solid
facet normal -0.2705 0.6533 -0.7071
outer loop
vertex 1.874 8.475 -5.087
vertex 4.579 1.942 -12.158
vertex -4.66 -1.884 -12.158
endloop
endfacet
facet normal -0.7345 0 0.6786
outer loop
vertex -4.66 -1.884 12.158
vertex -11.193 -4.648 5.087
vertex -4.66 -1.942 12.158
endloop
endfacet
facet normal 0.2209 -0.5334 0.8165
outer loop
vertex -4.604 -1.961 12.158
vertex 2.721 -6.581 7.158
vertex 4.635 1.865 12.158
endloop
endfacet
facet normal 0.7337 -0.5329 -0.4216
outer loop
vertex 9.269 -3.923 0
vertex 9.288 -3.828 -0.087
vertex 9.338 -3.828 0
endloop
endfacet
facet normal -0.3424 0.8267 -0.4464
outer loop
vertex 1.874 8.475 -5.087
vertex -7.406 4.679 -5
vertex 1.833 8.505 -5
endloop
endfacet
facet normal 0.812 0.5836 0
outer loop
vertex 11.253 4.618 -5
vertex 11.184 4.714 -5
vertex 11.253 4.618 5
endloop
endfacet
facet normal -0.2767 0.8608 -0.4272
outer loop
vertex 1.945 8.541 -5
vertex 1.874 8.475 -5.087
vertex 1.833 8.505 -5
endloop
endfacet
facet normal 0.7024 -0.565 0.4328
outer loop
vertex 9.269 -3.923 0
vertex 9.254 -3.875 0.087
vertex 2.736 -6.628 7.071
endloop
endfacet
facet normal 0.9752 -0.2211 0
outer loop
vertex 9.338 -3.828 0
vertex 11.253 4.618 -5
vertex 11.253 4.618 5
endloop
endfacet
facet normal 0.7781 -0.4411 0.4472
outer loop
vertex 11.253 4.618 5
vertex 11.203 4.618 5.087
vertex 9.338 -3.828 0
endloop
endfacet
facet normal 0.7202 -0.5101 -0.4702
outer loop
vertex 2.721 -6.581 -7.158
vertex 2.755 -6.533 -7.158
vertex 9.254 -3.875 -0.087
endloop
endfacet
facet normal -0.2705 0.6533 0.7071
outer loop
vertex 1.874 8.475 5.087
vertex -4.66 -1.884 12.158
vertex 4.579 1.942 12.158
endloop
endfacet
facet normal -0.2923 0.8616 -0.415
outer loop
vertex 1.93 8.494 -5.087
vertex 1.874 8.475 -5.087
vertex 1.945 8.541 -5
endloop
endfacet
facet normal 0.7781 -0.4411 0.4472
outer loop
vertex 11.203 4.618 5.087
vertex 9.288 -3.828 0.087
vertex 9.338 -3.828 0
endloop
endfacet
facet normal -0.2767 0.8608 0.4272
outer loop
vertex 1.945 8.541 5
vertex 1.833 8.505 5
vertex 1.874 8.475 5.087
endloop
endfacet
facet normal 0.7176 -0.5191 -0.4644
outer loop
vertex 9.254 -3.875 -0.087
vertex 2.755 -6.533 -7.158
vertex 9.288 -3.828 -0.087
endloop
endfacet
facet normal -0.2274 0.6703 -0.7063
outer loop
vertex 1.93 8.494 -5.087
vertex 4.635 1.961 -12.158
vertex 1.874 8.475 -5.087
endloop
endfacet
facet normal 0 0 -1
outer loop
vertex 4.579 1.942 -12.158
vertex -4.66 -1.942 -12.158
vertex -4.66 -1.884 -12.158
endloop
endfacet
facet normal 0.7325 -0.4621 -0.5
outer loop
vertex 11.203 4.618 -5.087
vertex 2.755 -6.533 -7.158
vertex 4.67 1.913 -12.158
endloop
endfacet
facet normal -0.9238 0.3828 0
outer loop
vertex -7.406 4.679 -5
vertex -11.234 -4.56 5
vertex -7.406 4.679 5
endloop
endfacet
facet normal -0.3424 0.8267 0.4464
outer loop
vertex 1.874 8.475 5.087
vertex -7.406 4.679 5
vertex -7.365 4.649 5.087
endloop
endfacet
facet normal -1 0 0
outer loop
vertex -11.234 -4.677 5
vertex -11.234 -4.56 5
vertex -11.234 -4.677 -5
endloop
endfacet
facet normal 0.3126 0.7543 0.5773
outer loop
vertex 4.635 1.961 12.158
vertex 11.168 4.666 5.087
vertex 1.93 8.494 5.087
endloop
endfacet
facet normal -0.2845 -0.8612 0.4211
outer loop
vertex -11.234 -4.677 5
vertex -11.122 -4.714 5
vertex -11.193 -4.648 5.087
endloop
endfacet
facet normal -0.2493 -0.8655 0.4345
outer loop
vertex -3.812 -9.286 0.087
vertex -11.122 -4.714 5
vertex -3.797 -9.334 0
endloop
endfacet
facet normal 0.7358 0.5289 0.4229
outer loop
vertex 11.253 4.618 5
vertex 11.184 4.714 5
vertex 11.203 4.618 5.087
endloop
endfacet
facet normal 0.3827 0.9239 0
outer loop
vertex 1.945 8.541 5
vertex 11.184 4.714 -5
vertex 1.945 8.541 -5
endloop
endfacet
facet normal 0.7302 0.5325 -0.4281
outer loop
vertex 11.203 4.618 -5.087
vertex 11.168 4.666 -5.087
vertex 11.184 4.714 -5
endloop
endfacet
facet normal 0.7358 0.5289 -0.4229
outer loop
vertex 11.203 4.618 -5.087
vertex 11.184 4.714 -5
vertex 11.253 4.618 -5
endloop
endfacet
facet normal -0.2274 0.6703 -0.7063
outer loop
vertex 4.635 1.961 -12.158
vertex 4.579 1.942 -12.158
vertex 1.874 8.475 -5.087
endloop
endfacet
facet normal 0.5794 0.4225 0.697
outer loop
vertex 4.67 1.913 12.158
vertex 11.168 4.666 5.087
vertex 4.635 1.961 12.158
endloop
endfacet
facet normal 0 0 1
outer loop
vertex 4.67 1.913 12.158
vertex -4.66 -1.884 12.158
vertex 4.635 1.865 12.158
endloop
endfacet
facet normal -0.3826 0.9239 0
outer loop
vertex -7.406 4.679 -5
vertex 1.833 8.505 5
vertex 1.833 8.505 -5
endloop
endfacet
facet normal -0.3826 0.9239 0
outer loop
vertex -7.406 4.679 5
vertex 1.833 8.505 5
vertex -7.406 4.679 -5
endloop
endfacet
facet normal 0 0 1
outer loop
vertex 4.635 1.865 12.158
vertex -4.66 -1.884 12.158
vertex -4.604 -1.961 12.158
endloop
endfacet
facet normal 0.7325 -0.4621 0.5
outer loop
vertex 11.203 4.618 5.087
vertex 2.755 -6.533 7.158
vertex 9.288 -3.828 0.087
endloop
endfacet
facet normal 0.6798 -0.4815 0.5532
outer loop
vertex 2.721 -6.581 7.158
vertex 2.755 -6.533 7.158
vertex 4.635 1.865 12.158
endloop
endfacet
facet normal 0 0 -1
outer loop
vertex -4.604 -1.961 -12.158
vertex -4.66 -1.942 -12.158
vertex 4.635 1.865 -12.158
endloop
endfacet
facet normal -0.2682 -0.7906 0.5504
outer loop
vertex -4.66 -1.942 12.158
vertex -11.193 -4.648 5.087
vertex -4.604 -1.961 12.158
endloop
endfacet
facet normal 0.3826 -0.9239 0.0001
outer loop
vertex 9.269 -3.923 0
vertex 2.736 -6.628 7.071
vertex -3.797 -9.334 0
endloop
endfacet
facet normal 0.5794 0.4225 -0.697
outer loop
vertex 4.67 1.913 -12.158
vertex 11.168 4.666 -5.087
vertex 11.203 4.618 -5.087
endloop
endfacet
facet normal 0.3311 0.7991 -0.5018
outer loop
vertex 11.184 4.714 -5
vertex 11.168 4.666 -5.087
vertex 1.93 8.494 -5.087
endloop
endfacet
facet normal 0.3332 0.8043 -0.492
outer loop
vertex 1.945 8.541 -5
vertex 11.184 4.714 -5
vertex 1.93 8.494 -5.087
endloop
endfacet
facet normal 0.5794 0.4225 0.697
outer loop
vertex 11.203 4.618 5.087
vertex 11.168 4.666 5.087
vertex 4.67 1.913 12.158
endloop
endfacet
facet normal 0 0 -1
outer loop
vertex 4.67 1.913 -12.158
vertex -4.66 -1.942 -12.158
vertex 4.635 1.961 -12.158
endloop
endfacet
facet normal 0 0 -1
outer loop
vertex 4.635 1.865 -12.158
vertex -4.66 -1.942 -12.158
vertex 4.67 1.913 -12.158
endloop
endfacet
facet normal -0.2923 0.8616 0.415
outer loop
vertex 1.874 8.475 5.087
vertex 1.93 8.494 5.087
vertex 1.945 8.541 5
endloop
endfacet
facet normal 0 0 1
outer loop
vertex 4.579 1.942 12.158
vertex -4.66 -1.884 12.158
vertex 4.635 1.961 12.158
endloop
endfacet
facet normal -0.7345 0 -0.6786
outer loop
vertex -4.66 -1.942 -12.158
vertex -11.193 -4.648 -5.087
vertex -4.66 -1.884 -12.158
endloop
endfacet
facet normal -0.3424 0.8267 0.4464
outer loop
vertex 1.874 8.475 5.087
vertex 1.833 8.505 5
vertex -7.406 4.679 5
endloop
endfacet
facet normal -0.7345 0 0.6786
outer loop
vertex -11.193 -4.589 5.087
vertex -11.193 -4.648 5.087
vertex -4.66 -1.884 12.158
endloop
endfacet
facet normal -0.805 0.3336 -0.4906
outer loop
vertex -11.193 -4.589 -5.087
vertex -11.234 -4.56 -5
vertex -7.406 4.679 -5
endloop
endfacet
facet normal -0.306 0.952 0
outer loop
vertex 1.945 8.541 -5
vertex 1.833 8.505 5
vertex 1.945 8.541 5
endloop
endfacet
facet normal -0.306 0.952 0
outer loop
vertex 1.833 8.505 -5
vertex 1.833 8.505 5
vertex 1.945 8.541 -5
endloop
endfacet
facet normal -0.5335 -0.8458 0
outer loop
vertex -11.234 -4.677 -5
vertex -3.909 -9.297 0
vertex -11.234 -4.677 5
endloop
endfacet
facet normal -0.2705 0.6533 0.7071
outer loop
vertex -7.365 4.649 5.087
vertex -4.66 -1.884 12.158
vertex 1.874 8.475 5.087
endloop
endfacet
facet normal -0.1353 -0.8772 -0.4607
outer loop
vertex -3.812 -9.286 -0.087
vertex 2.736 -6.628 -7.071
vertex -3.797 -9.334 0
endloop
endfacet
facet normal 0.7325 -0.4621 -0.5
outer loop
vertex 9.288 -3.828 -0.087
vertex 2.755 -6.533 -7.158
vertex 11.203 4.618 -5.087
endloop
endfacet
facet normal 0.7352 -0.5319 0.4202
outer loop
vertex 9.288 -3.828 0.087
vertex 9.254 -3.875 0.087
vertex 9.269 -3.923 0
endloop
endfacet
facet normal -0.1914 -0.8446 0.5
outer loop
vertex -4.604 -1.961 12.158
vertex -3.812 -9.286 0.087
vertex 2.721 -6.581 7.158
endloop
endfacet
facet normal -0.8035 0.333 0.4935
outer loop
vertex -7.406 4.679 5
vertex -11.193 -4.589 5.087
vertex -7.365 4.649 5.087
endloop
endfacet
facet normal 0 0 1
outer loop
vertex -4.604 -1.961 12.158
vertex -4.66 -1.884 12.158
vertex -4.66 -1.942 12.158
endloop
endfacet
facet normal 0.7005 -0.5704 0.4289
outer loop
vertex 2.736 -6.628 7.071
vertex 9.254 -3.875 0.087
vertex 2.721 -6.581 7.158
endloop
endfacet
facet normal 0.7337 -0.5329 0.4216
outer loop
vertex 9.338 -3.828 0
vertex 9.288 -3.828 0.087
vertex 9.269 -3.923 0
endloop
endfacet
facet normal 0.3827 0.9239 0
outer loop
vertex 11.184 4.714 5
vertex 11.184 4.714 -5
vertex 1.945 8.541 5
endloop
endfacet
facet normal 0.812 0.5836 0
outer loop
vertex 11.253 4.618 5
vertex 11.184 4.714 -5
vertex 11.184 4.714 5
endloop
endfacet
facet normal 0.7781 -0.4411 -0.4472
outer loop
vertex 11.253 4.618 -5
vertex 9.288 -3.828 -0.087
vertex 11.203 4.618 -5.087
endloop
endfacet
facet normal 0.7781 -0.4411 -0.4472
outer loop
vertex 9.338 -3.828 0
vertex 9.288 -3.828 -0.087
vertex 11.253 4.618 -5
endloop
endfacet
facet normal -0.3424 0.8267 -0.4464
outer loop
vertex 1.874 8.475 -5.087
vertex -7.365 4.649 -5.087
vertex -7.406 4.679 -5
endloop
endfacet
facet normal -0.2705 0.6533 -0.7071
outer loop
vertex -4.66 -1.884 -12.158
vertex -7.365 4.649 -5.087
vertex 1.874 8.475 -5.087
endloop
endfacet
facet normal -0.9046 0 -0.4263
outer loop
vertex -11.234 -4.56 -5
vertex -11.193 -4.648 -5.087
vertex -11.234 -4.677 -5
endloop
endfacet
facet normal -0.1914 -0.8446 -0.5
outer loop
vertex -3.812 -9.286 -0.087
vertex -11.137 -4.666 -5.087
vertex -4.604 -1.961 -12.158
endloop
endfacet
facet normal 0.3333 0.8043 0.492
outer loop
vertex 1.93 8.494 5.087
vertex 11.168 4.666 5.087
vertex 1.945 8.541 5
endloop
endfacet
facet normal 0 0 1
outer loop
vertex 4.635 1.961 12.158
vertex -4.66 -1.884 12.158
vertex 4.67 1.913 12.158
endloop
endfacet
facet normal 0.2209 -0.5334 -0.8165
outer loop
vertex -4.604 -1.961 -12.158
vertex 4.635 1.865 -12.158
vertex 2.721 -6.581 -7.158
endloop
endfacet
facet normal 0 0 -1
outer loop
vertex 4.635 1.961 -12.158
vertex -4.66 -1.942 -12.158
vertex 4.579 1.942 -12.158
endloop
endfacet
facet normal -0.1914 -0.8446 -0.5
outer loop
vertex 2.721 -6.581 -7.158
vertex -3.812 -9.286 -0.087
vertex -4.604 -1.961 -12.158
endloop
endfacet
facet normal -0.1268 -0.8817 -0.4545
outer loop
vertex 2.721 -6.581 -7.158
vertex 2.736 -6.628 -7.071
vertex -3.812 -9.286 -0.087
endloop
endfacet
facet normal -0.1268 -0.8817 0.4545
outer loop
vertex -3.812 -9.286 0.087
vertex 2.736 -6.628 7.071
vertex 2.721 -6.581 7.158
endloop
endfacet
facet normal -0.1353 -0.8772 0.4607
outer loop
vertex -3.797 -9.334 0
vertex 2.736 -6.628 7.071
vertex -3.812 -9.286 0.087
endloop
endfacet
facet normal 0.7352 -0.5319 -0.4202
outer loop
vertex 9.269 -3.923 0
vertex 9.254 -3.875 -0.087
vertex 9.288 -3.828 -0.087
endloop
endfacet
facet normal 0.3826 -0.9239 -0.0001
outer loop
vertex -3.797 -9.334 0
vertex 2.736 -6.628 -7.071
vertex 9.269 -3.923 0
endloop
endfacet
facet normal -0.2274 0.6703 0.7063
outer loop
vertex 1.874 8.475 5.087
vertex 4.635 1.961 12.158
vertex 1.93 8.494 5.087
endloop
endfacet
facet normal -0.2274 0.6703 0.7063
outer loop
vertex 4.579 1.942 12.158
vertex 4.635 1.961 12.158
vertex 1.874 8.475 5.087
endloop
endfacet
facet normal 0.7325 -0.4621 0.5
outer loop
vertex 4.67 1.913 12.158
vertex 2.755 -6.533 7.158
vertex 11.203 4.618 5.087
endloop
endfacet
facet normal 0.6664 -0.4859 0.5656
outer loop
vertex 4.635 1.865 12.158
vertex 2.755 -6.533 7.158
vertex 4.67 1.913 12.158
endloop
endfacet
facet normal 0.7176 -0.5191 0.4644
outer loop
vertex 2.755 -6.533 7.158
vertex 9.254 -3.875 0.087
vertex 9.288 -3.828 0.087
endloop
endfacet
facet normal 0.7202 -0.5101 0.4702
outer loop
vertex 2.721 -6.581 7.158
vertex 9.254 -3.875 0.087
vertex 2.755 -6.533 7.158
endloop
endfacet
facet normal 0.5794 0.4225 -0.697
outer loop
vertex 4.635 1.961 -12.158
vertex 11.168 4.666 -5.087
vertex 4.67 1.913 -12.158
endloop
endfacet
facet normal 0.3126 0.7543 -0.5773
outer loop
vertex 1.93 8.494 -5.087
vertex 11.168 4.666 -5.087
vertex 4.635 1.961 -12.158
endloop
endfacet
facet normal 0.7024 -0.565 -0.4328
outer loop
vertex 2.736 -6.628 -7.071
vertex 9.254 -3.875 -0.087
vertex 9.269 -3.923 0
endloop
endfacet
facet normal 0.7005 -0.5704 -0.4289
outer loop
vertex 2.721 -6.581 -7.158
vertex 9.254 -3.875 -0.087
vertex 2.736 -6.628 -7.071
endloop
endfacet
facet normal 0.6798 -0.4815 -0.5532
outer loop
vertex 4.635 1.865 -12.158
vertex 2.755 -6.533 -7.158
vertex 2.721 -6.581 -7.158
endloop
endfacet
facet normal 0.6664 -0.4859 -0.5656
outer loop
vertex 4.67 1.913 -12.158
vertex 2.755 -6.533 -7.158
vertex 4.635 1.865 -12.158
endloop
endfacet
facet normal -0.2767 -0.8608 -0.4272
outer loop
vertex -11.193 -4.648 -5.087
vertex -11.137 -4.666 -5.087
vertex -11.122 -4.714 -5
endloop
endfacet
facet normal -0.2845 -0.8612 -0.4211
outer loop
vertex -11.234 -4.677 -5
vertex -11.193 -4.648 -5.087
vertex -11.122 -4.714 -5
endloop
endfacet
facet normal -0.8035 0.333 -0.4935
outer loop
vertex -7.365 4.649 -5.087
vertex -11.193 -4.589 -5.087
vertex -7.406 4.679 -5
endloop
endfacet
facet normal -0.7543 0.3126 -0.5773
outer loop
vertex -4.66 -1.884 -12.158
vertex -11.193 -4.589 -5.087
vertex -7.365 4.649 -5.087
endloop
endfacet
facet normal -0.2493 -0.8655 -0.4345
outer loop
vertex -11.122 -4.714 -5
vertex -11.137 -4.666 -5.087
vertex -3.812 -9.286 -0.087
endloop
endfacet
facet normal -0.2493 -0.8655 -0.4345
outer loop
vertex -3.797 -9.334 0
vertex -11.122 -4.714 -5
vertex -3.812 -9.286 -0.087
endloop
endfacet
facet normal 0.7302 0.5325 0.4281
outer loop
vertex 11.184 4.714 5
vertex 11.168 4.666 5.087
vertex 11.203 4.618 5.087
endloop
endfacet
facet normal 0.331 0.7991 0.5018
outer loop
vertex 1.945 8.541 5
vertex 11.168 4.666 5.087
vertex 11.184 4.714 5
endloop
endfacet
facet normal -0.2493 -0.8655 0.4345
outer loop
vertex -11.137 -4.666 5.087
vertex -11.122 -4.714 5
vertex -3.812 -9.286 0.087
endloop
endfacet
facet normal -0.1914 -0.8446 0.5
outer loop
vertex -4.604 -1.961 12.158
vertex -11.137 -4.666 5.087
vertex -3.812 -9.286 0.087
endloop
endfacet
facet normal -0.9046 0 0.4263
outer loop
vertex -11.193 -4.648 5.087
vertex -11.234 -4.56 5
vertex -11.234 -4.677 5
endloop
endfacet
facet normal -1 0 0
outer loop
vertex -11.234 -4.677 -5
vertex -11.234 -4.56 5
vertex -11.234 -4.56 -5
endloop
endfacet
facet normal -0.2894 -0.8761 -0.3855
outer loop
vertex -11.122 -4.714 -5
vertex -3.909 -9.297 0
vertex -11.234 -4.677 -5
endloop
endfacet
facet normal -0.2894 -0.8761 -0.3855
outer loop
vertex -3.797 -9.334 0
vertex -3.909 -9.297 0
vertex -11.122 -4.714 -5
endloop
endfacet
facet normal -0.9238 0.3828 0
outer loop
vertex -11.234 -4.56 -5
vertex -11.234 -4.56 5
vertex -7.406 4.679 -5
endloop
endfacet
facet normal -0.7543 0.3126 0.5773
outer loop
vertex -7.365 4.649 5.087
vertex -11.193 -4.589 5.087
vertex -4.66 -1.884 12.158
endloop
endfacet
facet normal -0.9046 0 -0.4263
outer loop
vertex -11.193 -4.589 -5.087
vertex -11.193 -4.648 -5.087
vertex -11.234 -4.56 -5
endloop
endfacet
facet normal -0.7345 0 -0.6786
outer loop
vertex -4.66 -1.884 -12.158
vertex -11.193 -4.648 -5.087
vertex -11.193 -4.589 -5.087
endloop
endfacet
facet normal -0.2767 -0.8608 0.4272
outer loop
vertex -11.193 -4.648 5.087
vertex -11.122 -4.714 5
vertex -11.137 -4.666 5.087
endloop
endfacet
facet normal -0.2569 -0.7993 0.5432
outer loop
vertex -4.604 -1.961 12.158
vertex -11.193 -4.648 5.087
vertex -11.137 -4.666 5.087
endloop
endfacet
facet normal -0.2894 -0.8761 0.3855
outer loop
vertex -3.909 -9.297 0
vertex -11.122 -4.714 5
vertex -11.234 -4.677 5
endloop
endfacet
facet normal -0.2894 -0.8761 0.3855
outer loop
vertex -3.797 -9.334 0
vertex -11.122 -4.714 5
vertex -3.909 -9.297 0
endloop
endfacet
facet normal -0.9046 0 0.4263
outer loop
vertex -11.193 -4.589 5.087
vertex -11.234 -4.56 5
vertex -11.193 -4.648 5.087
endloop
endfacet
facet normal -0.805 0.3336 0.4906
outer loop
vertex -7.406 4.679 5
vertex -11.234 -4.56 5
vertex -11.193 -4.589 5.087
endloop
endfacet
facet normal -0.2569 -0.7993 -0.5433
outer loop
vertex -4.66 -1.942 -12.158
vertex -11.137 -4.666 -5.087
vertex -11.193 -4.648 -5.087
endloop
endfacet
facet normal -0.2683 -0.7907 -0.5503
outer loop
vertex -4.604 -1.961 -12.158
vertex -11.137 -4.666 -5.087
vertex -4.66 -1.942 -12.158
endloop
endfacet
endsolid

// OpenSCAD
// Auto-generated OpenSCAD file

    inner_points = 10*[[0.4619566327305774, 0.19130099183283442, -1.2071067811865475], [-0.46195663273057797, -0.19130099183283406, -1.2071067811865475], [0.46195663273057797, 0.19130099183283406, 1.2071067811865475], [-0.4619566327305774, -0.19130099183283442, 1.2071067811865475], [1.1152619679663673, 0.46184144897825313, -0.5000000000000002], [-1.1152619679663673, -0.461841448978253, -0.4999999999999998], [1.1152619679663673, 0.461841448978253, 0.4999999999999998], [-1.1152619679663673, -0.46184144897825313, 0.5000000000000002], [0.27054045714541874, -0.6533053352357897, -0.7071067811865477], [0.2705404571454191, -0.6533053352357899, 0.7071067811865475], [0.9238457923812087, -0.38276487809037096, -2.792716462039856e-16], [-0.38276487809037096, -0.9238457923812087, -4.7467621895578584e-17], [0.19141617558515864, 0.8446063270686242, -0.49999999999999994], [-0.7324970898759966, 0.46200434340295565, -0.4999999999999998], [0.19141617558515892, 0.844606327068624, 0.5000000000000001], [-0.7324970898759964, 0.4620043434029555, 0.5000000000000002]];

    outer_points = 10*[[-1.20715085540928, -0.49989358214569235, 8.597197695362629e-07], [-1.2069745470430784, 0.49989358214569235, 0.020630814483457764], [1.2069745470430784, -0.49989358214569235, -0.020630814483457764], [1.20715085540928, 0.49989358214569235, -8.597197695362629e-07], [-0.5001945645070083, -1.2068498657593993, -0.020629598656099847], [-0.49976891845816496, 1.2068498657593993, 0.029175517925539712], [0.49976891845816496, -1.2068498657593993, -0.029175517925539712], [0.5001945645070083, 1.2068498657593993, 0.020629598656099847], [-0.7010393684168068, -0.014588113623628919, 0.7129733451333711], [0.7131225510703787, -0.014588113623628919, 0.7008875901995837], [0.005916922485465028, -0.721544397237336, 0.6923428867575018], [0.006166260168106925, 0.6923681699900782, 0.721518048575453], [-0.5061114869924733, -0.4853054685220634, -0.7129724854136016], [-0.5059351786262719, 0.5144816957693212, -0.6923425306499132], [0.4938519959726999, -0.4853054685220634, -0.7215184046830415], [0.4940283043389013, 0.5144816957693212, -0.7008884499193532]];

    // Convex hull for inner set (I)
    module inner_hull() {
        hull() {
            for (p = inner_points) {
                translate(p) sphere(r=0.1);
            }
        }
    }

    // Convex hull for outer set (O) minus inner hull (O \ I)
    module outer_minus_inner() {
        difference() {
            hull() {
                for (p = outer_points) {
                    translate(p) sphere(r=0.1);
                }
            }
            inner_hull(); // Subtract inner hull
        }
    }

    // Convex hull for outer set (O) minus all translated inner hulls
    module outer_minus_AllTranslationInner() {
        difference() {
            hull() {
                for (p = outer_points) {
                    translate(p) sphere(r=0.1);
                }
            }
            hull() {
                translate([0,0,50]) inner_hull();
                translate([0,0,-50]) inner_hull();
            }; // Subtract translated inner hulls
        }
    }

    // Difference between outer_minus_inner and outer_minus_AllTranslationInner
    module outer_minus_inner_diff() {
        difference() {
            // Outer minus inner
            difference() {
                hull() {
                    for (p = outer_points) {
                        translate(p) sphere(r=0.1);
                    }
                }
                inner_hull();
            }

            // Subtract Outer minus AllTranslationInner
            difference() {
                hull() {
                    for (p = outer_points) {
                        translate(p) sphere(r=0.1);
                    }
                }
                hull() {
                    translate([0,0,50]) inner_hull();
                    translate([0,0,-50]) inner_hull();
                };
            }
        }
    }

    // Rendering all with colors applied
    color([1, 0, 0, 0.5]) inner_hull(); // Transparent red
    
